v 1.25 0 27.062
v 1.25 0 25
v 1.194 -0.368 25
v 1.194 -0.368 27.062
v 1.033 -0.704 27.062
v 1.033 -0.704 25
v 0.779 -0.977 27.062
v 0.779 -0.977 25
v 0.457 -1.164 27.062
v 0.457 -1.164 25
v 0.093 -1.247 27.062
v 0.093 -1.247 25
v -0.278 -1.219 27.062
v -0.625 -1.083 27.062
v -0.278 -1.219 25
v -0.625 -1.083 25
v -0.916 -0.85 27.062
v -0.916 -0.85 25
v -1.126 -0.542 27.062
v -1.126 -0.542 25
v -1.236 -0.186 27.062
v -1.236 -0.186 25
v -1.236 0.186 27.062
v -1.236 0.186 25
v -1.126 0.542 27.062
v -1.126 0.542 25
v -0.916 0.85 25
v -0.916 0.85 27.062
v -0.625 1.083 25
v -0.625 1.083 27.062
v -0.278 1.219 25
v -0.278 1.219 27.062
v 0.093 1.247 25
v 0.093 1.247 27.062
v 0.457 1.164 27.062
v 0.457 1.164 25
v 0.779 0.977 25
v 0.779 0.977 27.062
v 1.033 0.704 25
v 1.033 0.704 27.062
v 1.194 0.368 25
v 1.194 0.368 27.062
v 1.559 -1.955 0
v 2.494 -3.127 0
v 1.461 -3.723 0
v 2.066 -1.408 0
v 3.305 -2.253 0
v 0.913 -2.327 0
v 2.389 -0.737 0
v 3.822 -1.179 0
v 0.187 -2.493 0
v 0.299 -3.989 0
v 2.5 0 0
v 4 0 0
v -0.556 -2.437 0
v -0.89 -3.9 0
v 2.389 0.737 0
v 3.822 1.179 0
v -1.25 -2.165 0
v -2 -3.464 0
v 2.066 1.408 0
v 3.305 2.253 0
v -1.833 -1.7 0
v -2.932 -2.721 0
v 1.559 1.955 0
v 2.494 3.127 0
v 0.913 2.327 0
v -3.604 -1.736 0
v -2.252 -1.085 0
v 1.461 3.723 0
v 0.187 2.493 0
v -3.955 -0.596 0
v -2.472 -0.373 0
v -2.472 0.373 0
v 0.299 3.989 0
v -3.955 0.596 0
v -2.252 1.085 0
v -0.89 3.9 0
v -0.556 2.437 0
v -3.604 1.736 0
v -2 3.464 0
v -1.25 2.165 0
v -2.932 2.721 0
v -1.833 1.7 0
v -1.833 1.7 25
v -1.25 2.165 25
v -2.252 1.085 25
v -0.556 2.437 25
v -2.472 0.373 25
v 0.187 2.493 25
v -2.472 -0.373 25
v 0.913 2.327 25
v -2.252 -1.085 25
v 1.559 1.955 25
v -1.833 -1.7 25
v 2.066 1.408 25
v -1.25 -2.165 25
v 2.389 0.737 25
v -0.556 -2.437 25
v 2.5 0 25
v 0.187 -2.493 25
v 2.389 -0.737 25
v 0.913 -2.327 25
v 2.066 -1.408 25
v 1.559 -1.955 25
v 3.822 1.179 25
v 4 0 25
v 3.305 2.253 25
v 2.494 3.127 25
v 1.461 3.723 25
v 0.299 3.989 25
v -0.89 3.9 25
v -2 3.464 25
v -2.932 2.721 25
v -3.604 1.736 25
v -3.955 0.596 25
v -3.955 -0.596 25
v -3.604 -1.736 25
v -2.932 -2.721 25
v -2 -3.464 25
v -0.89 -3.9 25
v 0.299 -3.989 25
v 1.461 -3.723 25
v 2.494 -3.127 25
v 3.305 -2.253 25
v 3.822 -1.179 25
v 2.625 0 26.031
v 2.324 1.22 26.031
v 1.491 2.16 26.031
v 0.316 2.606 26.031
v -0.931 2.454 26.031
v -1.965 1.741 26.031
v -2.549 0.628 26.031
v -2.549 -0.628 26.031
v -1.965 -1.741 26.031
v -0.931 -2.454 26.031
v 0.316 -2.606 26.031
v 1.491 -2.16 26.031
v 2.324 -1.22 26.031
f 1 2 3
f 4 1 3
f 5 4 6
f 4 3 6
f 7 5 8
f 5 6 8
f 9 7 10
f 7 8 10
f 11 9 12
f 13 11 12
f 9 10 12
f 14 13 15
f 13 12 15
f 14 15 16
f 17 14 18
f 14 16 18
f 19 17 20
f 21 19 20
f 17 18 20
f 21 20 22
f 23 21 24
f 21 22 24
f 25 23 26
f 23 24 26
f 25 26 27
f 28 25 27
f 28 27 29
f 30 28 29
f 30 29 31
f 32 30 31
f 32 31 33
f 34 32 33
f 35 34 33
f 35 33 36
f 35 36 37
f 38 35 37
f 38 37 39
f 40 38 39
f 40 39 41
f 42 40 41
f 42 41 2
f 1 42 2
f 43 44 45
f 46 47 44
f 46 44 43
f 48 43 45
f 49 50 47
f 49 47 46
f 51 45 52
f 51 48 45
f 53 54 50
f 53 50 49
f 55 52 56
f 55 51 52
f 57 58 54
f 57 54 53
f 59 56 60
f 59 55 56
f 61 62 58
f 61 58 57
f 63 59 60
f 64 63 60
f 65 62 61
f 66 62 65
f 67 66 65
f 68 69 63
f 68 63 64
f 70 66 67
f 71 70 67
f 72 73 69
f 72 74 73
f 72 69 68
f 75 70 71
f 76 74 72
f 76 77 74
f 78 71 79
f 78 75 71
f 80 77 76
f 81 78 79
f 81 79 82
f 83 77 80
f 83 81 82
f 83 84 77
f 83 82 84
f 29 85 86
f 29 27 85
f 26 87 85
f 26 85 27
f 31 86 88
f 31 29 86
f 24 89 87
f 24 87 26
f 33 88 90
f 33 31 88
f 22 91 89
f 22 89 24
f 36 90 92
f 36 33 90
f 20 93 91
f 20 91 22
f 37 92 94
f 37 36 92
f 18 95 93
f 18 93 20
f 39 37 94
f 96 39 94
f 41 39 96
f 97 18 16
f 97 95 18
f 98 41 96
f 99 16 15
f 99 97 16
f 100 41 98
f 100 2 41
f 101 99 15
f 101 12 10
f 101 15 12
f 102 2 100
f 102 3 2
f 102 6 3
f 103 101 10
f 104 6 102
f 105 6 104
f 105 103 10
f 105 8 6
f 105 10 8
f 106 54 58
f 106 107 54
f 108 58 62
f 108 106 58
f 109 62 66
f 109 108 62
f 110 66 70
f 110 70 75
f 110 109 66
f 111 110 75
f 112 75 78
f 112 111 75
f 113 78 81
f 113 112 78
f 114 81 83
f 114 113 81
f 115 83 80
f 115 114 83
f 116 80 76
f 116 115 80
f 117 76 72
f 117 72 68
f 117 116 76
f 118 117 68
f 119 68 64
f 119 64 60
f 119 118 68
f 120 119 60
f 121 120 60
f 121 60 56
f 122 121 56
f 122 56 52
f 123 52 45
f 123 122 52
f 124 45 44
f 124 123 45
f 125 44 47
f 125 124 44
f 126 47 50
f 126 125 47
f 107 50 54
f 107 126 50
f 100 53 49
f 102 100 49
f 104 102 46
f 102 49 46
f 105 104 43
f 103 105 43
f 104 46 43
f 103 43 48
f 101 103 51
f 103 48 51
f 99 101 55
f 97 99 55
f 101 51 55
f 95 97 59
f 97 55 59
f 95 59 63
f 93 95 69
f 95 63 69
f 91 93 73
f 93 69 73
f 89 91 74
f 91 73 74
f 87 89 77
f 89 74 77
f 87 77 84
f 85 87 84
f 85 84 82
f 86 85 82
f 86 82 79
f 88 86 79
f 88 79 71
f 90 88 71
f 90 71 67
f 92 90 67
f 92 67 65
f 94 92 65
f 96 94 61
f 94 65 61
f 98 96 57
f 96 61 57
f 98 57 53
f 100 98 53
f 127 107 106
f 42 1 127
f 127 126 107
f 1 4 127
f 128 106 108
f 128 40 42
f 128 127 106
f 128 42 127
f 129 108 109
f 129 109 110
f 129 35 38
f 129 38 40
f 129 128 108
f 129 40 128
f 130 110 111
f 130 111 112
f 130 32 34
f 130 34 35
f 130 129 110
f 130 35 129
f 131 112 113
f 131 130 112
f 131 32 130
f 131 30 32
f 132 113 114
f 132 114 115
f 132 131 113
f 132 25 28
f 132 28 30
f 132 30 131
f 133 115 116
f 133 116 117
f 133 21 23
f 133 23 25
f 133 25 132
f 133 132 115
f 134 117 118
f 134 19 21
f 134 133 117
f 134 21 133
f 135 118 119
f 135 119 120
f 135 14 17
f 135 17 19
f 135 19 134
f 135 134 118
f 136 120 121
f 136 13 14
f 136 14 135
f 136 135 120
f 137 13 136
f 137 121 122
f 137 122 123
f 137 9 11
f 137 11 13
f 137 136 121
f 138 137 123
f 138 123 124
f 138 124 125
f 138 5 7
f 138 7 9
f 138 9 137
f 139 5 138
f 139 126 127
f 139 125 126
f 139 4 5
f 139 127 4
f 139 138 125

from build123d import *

# Parameters (mm, degrees)
F0_W     = 4
F0_H     = 25
F2_R     = 2.5
F3_DEPTH = 25
F4_R     = 1.25
F5_DEPTH = 25


with BuildPart() as f1:
    # F0 (on Front) → F1 (revolve)
    with BuildSketch(Plane.XZ):
        with Locations((2, 12.5)):
            Rectangle(F0_W, F0_H)
        Polygon((0, 28), (0, 25), (4, 25), align=None)
    revolve(axis=Axis((0, 0, 12.5), (0, 0, 1)))

    # F2 (on face) → F3 (cut)
    with BuildSketch(Plane(origin=(0, 0, 0), x_dir=(1, 0, 0), z_dir=(0, 0, -1))):
        Circle(F2_R)
    extrude(amount=-F3_DEPTH, mode=Mode.SUBTRACT)

    # F4 (on face) → F5 (cut)
    with BuildSketch(Plane(origin=(0, 0, 25), x_dir=(1, 0, 0), z_dir=(0, 0, -1))):
        Circle(F4_R)
    extrude(amount=-F5_DEPTH, mode=Mode.SUBTRACT)


solid = f1.part
